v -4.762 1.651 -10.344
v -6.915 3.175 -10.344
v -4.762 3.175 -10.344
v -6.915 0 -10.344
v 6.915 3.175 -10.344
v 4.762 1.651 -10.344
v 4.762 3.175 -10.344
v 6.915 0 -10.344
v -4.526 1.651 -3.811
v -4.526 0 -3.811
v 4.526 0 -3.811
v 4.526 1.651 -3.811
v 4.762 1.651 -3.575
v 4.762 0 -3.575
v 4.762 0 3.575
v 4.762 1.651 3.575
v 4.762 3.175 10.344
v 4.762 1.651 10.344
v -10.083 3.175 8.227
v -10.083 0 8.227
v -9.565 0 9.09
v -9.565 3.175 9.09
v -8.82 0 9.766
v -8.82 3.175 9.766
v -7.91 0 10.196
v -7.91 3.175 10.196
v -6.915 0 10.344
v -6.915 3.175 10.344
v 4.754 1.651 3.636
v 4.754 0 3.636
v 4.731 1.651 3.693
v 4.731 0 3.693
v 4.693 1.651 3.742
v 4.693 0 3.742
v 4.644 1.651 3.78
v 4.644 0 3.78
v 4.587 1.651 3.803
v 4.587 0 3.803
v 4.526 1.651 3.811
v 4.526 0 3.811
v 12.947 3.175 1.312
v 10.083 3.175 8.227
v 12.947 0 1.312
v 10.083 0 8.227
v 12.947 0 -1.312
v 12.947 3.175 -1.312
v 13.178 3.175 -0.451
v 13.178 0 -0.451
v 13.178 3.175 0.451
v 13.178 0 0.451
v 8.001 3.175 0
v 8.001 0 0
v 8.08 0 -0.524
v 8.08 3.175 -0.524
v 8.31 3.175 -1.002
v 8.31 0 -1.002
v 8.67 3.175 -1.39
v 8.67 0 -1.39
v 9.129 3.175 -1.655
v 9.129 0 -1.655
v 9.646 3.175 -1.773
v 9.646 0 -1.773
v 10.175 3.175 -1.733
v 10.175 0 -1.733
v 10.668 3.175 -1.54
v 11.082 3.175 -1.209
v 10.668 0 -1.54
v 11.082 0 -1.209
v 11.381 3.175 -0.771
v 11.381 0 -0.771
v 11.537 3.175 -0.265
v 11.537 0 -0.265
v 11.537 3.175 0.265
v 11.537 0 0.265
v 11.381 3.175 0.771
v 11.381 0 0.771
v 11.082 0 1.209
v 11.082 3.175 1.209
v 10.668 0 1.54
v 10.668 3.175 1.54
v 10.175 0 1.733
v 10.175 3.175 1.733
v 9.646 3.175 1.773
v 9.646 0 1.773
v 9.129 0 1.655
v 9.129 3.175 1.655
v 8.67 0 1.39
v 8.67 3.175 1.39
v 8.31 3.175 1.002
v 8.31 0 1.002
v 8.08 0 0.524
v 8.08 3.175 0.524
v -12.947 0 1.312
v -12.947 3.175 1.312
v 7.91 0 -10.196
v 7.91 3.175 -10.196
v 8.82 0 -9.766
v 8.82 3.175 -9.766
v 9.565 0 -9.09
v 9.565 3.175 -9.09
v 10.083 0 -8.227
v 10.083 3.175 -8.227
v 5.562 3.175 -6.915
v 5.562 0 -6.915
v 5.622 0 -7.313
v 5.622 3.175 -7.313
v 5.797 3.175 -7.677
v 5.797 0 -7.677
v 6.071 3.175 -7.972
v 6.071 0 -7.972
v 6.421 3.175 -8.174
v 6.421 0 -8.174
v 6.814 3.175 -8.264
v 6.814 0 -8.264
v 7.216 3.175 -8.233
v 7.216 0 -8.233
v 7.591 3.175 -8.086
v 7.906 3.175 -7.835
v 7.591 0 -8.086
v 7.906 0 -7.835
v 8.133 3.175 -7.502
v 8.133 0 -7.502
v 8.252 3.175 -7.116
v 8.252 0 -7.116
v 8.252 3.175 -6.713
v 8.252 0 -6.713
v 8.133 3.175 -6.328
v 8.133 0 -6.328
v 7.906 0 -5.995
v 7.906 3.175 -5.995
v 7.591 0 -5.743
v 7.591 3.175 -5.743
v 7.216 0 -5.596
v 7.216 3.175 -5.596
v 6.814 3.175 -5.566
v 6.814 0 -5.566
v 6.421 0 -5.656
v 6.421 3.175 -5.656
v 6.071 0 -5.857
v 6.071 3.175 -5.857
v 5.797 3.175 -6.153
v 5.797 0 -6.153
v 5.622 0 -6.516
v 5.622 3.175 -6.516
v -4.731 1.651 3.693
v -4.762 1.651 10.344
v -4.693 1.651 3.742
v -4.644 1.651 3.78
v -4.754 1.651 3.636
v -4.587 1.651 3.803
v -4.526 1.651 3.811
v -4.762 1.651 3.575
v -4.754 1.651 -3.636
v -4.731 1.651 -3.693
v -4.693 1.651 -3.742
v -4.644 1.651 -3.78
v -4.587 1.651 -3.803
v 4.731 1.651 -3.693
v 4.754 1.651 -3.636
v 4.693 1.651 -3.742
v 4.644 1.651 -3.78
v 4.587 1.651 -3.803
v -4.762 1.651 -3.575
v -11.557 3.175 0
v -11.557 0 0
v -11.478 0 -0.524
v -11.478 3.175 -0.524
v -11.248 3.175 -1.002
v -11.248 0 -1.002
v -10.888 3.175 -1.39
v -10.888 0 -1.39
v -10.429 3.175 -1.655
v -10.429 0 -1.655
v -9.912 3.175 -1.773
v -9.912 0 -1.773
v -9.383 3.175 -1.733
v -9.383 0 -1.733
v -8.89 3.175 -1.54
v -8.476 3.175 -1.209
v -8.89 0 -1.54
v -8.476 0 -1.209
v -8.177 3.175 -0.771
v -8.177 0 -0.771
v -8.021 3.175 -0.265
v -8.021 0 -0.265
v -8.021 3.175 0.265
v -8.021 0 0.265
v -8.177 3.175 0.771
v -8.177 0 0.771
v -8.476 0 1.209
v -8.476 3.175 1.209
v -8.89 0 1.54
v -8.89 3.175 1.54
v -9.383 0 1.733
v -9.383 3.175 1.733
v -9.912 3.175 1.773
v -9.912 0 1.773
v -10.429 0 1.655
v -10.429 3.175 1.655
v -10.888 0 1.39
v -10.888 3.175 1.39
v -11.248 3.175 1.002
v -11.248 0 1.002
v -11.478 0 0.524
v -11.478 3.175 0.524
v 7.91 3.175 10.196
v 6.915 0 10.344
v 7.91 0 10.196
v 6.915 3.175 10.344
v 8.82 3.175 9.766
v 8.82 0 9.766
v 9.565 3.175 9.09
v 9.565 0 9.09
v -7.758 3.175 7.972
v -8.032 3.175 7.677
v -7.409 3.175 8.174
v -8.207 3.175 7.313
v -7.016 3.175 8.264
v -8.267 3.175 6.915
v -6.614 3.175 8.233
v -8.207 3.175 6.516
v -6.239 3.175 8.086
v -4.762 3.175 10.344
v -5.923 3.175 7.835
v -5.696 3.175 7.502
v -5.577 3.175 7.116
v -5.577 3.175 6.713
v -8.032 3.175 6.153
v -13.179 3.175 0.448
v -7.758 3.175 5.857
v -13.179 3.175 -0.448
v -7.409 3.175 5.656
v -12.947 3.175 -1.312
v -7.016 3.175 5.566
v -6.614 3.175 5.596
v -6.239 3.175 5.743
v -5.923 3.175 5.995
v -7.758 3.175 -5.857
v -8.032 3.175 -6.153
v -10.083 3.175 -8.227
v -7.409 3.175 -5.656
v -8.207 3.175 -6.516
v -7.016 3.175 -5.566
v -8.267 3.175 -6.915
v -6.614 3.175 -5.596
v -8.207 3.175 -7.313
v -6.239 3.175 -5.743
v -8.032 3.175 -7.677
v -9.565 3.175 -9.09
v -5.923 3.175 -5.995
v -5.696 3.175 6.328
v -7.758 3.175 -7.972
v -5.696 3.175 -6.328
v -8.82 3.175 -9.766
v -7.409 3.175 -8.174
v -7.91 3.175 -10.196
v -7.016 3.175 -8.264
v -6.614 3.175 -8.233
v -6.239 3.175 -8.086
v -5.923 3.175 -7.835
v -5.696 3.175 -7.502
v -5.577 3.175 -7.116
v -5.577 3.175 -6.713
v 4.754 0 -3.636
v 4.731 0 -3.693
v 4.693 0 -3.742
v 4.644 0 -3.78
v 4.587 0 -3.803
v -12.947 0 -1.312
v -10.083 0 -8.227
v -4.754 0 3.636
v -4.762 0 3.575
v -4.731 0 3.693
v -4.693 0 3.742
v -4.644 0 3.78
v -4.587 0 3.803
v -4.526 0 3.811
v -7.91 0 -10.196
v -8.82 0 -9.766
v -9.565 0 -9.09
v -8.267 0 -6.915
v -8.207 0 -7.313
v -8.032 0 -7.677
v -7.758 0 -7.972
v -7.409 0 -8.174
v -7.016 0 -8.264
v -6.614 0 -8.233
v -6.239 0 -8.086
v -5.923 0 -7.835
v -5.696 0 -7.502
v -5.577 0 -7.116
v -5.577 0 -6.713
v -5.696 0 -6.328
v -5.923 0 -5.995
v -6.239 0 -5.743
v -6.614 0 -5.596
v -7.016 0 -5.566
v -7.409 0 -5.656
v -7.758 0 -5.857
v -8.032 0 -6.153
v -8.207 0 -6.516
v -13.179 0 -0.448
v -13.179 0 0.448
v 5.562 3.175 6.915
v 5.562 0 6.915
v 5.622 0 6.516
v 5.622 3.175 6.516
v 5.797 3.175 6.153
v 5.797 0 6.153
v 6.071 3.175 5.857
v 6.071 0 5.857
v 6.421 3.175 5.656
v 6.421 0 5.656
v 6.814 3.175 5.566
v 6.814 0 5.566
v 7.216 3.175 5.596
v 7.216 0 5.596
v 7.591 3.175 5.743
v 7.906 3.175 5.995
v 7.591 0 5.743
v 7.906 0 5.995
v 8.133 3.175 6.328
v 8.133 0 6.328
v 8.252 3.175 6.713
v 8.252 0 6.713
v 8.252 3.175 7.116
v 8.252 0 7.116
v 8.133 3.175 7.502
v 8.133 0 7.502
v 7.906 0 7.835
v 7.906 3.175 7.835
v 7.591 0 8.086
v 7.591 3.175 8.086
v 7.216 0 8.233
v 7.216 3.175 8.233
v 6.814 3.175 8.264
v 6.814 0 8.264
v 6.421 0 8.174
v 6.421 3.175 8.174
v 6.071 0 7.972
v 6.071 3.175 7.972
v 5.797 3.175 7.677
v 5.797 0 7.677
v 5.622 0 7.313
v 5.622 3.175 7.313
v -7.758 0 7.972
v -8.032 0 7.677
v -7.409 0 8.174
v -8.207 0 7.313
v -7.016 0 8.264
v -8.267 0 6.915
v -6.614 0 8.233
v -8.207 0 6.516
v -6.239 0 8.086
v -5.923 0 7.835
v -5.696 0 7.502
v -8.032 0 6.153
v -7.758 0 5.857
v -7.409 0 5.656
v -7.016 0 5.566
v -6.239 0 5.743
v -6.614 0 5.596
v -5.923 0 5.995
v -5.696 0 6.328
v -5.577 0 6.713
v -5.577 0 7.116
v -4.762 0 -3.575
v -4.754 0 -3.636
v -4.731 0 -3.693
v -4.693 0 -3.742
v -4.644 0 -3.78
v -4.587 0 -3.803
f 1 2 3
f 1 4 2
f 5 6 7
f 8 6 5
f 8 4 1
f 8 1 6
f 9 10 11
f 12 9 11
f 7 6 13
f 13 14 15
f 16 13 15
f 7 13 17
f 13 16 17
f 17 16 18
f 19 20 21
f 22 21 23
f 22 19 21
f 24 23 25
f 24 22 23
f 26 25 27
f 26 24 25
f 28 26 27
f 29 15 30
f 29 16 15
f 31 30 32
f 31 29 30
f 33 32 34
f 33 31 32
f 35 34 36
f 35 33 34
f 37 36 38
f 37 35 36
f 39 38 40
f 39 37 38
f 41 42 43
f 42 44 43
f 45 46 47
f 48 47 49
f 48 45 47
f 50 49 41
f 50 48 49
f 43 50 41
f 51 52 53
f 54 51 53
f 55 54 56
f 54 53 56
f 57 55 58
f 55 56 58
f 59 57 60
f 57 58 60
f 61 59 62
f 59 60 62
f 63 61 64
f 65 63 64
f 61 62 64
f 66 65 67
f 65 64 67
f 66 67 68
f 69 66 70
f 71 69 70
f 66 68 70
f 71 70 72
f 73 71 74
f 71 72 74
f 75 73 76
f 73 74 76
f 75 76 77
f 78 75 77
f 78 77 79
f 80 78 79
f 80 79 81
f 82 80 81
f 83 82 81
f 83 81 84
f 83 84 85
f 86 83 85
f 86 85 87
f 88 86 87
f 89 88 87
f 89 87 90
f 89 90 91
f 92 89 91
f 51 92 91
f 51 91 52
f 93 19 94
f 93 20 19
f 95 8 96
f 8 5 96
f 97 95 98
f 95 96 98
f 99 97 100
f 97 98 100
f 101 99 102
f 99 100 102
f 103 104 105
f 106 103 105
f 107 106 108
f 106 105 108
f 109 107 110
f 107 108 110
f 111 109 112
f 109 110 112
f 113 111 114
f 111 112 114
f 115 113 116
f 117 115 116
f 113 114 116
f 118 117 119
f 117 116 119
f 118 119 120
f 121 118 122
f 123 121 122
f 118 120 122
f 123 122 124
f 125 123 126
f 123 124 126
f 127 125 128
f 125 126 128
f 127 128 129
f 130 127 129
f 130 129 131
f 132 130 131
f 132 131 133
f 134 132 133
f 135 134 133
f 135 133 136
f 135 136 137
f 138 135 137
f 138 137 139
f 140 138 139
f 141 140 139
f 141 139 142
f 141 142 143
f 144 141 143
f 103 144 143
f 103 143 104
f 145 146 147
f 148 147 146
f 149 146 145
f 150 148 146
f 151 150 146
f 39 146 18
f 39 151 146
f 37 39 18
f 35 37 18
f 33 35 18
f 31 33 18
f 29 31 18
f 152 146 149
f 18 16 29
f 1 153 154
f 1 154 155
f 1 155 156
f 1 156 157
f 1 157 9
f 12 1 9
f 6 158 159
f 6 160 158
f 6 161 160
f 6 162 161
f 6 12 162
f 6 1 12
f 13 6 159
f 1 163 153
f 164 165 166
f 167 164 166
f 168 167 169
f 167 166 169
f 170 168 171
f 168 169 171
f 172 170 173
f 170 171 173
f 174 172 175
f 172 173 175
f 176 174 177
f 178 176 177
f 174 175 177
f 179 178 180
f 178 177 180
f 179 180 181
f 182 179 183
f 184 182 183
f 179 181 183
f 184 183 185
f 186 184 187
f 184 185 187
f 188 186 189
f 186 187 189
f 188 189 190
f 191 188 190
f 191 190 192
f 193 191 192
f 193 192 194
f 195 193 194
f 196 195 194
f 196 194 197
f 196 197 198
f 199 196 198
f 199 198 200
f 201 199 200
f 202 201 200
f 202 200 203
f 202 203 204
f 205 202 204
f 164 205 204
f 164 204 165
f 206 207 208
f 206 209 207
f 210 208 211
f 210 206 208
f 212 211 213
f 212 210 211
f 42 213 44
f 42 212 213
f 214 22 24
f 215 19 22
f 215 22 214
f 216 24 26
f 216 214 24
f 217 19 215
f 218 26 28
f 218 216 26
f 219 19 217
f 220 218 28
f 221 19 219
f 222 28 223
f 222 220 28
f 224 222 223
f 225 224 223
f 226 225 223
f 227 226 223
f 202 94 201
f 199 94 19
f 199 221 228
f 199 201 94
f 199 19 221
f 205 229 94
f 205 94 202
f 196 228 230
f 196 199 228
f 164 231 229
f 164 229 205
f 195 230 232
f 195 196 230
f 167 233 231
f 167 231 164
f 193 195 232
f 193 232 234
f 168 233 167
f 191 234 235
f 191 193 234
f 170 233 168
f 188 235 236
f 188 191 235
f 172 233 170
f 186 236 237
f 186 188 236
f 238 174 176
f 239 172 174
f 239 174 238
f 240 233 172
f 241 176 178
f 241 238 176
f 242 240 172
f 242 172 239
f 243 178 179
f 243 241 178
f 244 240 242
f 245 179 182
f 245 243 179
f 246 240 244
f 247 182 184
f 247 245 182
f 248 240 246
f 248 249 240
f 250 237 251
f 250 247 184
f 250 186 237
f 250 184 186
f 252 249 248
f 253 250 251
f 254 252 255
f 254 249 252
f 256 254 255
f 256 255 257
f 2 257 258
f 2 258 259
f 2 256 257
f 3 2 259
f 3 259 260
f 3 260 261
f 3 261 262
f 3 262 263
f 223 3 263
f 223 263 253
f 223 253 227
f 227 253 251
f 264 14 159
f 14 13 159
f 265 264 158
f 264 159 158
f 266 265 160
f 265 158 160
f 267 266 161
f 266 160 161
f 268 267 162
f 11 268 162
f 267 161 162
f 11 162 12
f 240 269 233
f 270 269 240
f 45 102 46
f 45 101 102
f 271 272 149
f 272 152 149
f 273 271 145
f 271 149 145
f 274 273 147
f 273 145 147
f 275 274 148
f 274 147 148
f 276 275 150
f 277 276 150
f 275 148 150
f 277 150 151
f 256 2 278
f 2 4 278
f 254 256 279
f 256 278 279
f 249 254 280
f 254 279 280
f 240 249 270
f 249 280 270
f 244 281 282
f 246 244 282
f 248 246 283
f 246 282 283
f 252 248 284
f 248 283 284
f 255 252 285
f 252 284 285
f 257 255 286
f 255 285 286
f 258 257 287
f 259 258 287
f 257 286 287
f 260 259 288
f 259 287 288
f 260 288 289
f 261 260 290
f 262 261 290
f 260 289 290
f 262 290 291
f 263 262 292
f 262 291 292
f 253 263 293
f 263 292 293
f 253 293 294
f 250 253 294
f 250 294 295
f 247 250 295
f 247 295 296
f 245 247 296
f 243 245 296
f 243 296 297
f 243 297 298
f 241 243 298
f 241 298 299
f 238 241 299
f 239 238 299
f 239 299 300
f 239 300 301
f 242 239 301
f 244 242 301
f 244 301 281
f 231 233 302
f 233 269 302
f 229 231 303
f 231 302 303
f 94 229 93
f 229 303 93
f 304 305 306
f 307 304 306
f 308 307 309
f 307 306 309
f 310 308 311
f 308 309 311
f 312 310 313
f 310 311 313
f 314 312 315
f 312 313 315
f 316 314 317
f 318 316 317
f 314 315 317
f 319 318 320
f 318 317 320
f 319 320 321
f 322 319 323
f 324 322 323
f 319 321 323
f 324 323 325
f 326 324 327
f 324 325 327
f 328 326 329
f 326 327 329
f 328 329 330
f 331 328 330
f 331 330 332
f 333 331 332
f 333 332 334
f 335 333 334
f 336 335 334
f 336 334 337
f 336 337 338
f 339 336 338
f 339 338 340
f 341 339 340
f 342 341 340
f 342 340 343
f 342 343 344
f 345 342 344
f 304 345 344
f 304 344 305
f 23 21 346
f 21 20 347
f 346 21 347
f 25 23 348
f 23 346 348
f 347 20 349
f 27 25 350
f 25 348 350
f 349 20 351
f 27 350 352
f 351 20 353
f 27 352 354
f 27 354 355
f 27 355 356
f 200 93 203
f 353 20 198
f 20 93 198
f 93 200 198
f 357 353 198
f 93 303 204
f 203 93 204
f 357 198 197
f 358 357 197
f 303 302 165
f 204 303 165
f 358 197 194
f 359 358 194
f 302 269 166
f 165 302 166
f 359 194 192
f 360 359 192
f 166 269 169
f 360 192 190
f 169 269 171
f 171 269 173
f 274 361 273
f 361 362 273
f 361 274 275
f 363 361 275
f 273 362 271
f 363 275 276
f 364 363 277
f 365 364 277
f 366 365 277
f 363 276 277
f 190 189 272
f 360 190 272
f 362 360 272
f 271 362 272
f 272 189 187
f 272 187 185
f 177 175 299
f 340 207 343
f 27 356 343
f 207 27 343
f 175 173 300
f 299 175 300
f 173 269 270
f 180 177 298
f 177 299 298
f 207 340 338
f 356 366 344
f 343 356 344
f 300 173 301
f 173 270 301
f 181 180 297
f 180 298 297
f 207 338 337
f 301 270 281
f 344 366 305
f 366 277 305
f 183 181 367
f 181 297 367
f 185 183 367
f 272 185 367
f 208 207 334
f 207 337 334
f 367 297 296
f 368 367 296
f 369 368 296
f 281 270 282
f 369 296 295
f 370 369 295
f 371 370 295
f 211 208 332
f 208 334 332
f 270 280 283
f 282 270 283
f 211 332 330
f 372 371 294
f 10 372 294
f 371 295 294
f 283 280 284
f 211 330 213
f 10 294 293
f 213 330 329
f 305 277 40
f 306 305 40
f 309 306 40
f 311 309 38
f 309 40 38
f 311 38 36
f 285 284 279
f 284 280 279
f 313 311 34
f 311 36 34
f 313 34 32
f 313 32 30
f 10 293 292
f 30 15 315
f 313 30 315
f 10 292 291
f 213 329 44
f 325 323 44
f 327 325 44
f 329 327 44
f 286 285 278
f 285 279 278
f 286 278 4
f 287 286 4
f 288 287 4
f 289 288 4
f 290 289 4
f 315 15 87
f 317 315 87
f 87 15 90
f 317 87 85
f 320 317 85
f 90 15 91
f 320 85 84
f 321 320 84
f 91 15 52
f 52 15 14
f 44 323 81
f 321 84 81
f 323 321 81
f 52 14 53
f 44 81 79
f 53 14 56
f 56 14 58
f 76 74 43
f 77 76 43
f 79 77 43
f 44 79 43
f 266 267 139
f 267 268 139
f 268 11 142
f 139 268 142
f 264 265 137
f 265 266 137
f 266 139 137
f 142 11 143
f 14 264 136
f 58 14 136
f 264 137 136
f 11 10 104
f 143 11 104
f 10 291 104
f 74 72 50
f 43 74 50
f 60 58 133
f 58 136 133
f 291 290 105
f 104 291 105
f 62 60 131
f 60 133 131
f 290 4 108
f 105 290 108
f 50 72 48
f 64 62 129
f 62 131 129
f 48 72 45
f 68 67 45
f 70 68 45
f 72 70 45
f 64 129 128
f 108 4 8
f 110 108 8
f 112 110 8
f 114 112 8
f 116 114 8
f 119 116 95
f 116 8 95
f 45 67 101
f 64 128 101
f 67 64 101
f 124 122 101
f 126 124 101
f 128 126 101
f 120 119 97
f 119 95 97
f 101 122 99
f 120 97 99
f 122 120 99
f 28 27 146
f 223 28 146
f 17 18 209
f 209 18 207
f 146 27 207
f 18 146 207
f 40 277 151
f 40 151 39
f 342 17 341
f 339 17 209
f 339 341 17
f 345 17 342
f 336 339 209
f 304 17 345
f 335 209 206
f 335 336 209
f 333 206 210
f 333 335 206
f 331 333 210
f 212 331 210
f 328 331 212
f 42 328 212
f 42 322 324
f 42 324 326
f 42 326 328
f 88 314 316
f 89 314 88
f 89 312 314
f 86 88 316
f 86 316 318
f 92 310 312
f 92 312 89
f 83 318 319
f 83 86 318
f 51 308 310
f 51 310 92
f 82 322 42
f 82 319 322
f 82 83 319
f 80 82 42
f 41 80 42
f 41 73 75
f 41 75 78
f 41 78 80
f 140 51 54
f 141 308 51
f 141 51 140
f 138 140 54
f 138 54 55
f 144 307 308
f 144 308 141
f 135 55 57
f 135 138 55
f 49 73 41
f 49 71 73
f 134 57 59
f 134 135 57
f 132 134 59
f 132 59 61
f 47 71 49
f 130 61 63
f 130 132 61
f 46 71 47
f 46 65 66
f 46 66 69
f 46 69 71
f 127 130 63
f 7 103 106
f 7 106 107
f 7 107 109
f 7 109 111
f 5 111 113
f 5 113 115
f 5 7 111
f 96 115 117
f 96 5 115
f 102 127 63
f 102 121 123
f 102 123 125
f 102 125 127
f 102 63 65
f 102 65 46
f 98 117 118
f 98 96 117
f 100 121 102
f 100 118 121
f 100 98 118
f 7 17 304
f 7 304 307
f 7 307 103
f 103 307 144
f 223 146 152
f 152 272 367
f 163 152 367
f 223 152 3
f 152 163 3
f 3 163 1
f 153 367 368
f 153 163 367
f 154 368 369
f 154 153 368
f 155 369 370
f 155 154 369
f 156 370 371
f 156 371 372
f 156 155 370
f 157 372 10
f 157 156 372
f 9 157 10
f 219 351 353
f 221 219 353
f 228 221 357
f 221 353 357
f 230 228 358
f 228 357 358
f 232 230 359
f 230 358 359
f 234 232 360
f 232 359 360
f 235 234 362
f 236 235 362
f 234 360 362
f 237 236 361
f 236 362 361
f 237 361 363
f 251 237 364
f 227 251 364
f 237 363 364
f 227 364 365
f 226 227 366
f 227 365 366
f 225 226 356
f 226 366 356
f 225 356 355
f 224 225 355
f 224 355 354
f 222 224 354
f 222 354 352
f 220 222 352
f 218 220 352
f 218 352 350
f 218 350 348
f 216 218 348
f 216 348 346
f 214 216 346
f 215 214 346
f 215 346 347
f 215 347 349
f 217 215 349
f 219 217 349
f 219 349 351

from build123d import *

# Parameters (mm, degrees)
BOSS_EXTRUDE1_DEPTH    = 1.651
SKETCH2_W              = 9.525
SKETCH2_H              = 7.62254
CUT_EXTRUDE1_DEPTH     = 18.079855009
BOSS_EXTRUDE2_DEPTH    = 1.524
BOSS_EXTRUDE3_DEPTH    = 1.524
DRAFT1_DEPTH           = 3.175
DRAFT1_2_DEPTH         = 1.651
M2_5_CLEARANCE_HOLE1_D = 2.7051
M3_CLEARANCE_HOLE1_D   = 3.556
FILLET1_R              = 0.23622
FILLET2_R              = 3.429


# Read off the part's stored shape, not the designer's step: Draft1
with BuildPart() as part:
    # Sketch1 → Boss-Extrude1 (new body)
    with BuildSketch(Plane(origin=(0, 1.651, 0), x_dir=(1, 0, 0), z_dir=(0, 1, 0))):
        Polygon((13.490522855, 0), (9.205835634, 10.34415), (-9.205835634, 10.34415), (-13.490522855, 0), (-9.205835634, -10.34415), (13.019017606, -1.138314366), align=None)
    extrude(amount=-BOSS_EXTRUDE1_DEPTH)

    # Sketch2 → Cut-Extrude1 (cut, through all)
    with BuildSketch(Plane.XZ):
        Rectangle(SKETCH2_W, SKETCH2_H)
    extrude(amount=-CUT_EXTRUDE1_DEPTH, mode=Mode.SUBTRACT)

    # Sketch3 → Boss-Extrude2 (add)
    with BuildSketch(Plane(origin=(0, 1.651, 0), x_dir=(-1, 0, 0), z_dir=(0, 1, 0))):
        Polygon((-9.205835634, -10.34415), (-13.490522855, 0), (-13.019017606, 1.138314366), (-4.7625, 4.558275937), (-4.7625, -10.34415), align=None)
    extrude(amount=BOSS_EXTRUDE2_DEPTH)

    # Sketch4 → Boss-Extrude3 (add)
    with BuildSketch(Plane(origin=(0, 1.651, 0), x_dir=(-1, 0, 0), z_dir=(0, 1, 0))):
        Polygon((9.205835634, 10.34415), (13.490522855, 0), (9.205835634, -10.34415), (4.7625, -10.34415), (4.7625, 8.503660118), align=None)
    extrude(amount=BOSS_EXTRUDE3_DEPTH)

    # Draft1 outline → Draft1 (add)
    with BuildSketch(Plane(origin=(0, 0, 0), x_dir=(1, 0, 0), z_dir=(0, 1, 0))):
        Polygon((4.7625, -10.34415), (9.205835634, -10.34415), (13.019017606, -1.138314366), (4.7625, -4.558275937), align=None)
        Polygon((-9.205835634, -10.34415), (-4.7625, -10.34415), (-4.7625, -8.503660118), align=None)
    extrude(amount=DRAFT1_DEPTH)

    # Draft1 2 outline → Draft1 2 (add)
    with BuildSketch(Plane(origin=(0, 0, 0), x_dir=(1, 0, 0), z_dir=(0, 1, 0))):
        Polygon((-4.7625, -10.34415), (4.7625, -10.34415), (4.7625, -4.558275937), (-4.7625, -8.503660118), align=None)
    extrude(amount=DRAFT1_2_DEPTH)

    # M2.5 Clearance Hole1 (through all)
    with Locations(Plane(origin=(0, 3.175, 0), x_dir=(1, 0, 0), z_dir=(0, 1, 0))):
        with Locations((6.914797213, 6.914797213), (-6.914797213, 6.914797213), (-6.914797213, -6.914797213), (6.914797213, -6.914797213)):
            Hole(M2_5_CLEARANCE_HOLE1_D / 2)

    # M3 Clearance Hole1 (through all)
    with Locations(Plane(origin=(0, 3.175, 0), x_dir=(1, 0, 0), z_dir=(0, 1, 0))):
        with Locations((9.779, 0), (-9.779, 0)):
            Hole(M3_CLEARANCE_HOLE1_D / 2)

    # Fillet1
    fillet1_edges = [part.edges().sort_by_distance(p)[0] for p in [
        (4.7625, 0.8255, 3.81127),
        (4.7625, 0.8255, -3.81127),
        (-4.7625, 0.8255, -3.81127),
        (-4.7625, 0.8255, 3.81127),
    ]]
    fillet(fillet1_edges, radius=FILLET1_R)

    # Fillet2
    fillet2_edges = [part.edges().sort_by_distance(p)[0] for p in [
        (9.205835634, 1.5875, 10.34415),
        (-9.205835634, 1.5875, 10.34415),
        (-13.490522855, 1.5875, 0),
        (-9.205835634, 1.5875, -10.34415),
        (9.205835634, 1.5875, -10.34415),
        (13.490522855, 1.5875, 0),
    ]]
    fillet(fillet2_edges, radius=FILLET2_R)


solid = part.part
